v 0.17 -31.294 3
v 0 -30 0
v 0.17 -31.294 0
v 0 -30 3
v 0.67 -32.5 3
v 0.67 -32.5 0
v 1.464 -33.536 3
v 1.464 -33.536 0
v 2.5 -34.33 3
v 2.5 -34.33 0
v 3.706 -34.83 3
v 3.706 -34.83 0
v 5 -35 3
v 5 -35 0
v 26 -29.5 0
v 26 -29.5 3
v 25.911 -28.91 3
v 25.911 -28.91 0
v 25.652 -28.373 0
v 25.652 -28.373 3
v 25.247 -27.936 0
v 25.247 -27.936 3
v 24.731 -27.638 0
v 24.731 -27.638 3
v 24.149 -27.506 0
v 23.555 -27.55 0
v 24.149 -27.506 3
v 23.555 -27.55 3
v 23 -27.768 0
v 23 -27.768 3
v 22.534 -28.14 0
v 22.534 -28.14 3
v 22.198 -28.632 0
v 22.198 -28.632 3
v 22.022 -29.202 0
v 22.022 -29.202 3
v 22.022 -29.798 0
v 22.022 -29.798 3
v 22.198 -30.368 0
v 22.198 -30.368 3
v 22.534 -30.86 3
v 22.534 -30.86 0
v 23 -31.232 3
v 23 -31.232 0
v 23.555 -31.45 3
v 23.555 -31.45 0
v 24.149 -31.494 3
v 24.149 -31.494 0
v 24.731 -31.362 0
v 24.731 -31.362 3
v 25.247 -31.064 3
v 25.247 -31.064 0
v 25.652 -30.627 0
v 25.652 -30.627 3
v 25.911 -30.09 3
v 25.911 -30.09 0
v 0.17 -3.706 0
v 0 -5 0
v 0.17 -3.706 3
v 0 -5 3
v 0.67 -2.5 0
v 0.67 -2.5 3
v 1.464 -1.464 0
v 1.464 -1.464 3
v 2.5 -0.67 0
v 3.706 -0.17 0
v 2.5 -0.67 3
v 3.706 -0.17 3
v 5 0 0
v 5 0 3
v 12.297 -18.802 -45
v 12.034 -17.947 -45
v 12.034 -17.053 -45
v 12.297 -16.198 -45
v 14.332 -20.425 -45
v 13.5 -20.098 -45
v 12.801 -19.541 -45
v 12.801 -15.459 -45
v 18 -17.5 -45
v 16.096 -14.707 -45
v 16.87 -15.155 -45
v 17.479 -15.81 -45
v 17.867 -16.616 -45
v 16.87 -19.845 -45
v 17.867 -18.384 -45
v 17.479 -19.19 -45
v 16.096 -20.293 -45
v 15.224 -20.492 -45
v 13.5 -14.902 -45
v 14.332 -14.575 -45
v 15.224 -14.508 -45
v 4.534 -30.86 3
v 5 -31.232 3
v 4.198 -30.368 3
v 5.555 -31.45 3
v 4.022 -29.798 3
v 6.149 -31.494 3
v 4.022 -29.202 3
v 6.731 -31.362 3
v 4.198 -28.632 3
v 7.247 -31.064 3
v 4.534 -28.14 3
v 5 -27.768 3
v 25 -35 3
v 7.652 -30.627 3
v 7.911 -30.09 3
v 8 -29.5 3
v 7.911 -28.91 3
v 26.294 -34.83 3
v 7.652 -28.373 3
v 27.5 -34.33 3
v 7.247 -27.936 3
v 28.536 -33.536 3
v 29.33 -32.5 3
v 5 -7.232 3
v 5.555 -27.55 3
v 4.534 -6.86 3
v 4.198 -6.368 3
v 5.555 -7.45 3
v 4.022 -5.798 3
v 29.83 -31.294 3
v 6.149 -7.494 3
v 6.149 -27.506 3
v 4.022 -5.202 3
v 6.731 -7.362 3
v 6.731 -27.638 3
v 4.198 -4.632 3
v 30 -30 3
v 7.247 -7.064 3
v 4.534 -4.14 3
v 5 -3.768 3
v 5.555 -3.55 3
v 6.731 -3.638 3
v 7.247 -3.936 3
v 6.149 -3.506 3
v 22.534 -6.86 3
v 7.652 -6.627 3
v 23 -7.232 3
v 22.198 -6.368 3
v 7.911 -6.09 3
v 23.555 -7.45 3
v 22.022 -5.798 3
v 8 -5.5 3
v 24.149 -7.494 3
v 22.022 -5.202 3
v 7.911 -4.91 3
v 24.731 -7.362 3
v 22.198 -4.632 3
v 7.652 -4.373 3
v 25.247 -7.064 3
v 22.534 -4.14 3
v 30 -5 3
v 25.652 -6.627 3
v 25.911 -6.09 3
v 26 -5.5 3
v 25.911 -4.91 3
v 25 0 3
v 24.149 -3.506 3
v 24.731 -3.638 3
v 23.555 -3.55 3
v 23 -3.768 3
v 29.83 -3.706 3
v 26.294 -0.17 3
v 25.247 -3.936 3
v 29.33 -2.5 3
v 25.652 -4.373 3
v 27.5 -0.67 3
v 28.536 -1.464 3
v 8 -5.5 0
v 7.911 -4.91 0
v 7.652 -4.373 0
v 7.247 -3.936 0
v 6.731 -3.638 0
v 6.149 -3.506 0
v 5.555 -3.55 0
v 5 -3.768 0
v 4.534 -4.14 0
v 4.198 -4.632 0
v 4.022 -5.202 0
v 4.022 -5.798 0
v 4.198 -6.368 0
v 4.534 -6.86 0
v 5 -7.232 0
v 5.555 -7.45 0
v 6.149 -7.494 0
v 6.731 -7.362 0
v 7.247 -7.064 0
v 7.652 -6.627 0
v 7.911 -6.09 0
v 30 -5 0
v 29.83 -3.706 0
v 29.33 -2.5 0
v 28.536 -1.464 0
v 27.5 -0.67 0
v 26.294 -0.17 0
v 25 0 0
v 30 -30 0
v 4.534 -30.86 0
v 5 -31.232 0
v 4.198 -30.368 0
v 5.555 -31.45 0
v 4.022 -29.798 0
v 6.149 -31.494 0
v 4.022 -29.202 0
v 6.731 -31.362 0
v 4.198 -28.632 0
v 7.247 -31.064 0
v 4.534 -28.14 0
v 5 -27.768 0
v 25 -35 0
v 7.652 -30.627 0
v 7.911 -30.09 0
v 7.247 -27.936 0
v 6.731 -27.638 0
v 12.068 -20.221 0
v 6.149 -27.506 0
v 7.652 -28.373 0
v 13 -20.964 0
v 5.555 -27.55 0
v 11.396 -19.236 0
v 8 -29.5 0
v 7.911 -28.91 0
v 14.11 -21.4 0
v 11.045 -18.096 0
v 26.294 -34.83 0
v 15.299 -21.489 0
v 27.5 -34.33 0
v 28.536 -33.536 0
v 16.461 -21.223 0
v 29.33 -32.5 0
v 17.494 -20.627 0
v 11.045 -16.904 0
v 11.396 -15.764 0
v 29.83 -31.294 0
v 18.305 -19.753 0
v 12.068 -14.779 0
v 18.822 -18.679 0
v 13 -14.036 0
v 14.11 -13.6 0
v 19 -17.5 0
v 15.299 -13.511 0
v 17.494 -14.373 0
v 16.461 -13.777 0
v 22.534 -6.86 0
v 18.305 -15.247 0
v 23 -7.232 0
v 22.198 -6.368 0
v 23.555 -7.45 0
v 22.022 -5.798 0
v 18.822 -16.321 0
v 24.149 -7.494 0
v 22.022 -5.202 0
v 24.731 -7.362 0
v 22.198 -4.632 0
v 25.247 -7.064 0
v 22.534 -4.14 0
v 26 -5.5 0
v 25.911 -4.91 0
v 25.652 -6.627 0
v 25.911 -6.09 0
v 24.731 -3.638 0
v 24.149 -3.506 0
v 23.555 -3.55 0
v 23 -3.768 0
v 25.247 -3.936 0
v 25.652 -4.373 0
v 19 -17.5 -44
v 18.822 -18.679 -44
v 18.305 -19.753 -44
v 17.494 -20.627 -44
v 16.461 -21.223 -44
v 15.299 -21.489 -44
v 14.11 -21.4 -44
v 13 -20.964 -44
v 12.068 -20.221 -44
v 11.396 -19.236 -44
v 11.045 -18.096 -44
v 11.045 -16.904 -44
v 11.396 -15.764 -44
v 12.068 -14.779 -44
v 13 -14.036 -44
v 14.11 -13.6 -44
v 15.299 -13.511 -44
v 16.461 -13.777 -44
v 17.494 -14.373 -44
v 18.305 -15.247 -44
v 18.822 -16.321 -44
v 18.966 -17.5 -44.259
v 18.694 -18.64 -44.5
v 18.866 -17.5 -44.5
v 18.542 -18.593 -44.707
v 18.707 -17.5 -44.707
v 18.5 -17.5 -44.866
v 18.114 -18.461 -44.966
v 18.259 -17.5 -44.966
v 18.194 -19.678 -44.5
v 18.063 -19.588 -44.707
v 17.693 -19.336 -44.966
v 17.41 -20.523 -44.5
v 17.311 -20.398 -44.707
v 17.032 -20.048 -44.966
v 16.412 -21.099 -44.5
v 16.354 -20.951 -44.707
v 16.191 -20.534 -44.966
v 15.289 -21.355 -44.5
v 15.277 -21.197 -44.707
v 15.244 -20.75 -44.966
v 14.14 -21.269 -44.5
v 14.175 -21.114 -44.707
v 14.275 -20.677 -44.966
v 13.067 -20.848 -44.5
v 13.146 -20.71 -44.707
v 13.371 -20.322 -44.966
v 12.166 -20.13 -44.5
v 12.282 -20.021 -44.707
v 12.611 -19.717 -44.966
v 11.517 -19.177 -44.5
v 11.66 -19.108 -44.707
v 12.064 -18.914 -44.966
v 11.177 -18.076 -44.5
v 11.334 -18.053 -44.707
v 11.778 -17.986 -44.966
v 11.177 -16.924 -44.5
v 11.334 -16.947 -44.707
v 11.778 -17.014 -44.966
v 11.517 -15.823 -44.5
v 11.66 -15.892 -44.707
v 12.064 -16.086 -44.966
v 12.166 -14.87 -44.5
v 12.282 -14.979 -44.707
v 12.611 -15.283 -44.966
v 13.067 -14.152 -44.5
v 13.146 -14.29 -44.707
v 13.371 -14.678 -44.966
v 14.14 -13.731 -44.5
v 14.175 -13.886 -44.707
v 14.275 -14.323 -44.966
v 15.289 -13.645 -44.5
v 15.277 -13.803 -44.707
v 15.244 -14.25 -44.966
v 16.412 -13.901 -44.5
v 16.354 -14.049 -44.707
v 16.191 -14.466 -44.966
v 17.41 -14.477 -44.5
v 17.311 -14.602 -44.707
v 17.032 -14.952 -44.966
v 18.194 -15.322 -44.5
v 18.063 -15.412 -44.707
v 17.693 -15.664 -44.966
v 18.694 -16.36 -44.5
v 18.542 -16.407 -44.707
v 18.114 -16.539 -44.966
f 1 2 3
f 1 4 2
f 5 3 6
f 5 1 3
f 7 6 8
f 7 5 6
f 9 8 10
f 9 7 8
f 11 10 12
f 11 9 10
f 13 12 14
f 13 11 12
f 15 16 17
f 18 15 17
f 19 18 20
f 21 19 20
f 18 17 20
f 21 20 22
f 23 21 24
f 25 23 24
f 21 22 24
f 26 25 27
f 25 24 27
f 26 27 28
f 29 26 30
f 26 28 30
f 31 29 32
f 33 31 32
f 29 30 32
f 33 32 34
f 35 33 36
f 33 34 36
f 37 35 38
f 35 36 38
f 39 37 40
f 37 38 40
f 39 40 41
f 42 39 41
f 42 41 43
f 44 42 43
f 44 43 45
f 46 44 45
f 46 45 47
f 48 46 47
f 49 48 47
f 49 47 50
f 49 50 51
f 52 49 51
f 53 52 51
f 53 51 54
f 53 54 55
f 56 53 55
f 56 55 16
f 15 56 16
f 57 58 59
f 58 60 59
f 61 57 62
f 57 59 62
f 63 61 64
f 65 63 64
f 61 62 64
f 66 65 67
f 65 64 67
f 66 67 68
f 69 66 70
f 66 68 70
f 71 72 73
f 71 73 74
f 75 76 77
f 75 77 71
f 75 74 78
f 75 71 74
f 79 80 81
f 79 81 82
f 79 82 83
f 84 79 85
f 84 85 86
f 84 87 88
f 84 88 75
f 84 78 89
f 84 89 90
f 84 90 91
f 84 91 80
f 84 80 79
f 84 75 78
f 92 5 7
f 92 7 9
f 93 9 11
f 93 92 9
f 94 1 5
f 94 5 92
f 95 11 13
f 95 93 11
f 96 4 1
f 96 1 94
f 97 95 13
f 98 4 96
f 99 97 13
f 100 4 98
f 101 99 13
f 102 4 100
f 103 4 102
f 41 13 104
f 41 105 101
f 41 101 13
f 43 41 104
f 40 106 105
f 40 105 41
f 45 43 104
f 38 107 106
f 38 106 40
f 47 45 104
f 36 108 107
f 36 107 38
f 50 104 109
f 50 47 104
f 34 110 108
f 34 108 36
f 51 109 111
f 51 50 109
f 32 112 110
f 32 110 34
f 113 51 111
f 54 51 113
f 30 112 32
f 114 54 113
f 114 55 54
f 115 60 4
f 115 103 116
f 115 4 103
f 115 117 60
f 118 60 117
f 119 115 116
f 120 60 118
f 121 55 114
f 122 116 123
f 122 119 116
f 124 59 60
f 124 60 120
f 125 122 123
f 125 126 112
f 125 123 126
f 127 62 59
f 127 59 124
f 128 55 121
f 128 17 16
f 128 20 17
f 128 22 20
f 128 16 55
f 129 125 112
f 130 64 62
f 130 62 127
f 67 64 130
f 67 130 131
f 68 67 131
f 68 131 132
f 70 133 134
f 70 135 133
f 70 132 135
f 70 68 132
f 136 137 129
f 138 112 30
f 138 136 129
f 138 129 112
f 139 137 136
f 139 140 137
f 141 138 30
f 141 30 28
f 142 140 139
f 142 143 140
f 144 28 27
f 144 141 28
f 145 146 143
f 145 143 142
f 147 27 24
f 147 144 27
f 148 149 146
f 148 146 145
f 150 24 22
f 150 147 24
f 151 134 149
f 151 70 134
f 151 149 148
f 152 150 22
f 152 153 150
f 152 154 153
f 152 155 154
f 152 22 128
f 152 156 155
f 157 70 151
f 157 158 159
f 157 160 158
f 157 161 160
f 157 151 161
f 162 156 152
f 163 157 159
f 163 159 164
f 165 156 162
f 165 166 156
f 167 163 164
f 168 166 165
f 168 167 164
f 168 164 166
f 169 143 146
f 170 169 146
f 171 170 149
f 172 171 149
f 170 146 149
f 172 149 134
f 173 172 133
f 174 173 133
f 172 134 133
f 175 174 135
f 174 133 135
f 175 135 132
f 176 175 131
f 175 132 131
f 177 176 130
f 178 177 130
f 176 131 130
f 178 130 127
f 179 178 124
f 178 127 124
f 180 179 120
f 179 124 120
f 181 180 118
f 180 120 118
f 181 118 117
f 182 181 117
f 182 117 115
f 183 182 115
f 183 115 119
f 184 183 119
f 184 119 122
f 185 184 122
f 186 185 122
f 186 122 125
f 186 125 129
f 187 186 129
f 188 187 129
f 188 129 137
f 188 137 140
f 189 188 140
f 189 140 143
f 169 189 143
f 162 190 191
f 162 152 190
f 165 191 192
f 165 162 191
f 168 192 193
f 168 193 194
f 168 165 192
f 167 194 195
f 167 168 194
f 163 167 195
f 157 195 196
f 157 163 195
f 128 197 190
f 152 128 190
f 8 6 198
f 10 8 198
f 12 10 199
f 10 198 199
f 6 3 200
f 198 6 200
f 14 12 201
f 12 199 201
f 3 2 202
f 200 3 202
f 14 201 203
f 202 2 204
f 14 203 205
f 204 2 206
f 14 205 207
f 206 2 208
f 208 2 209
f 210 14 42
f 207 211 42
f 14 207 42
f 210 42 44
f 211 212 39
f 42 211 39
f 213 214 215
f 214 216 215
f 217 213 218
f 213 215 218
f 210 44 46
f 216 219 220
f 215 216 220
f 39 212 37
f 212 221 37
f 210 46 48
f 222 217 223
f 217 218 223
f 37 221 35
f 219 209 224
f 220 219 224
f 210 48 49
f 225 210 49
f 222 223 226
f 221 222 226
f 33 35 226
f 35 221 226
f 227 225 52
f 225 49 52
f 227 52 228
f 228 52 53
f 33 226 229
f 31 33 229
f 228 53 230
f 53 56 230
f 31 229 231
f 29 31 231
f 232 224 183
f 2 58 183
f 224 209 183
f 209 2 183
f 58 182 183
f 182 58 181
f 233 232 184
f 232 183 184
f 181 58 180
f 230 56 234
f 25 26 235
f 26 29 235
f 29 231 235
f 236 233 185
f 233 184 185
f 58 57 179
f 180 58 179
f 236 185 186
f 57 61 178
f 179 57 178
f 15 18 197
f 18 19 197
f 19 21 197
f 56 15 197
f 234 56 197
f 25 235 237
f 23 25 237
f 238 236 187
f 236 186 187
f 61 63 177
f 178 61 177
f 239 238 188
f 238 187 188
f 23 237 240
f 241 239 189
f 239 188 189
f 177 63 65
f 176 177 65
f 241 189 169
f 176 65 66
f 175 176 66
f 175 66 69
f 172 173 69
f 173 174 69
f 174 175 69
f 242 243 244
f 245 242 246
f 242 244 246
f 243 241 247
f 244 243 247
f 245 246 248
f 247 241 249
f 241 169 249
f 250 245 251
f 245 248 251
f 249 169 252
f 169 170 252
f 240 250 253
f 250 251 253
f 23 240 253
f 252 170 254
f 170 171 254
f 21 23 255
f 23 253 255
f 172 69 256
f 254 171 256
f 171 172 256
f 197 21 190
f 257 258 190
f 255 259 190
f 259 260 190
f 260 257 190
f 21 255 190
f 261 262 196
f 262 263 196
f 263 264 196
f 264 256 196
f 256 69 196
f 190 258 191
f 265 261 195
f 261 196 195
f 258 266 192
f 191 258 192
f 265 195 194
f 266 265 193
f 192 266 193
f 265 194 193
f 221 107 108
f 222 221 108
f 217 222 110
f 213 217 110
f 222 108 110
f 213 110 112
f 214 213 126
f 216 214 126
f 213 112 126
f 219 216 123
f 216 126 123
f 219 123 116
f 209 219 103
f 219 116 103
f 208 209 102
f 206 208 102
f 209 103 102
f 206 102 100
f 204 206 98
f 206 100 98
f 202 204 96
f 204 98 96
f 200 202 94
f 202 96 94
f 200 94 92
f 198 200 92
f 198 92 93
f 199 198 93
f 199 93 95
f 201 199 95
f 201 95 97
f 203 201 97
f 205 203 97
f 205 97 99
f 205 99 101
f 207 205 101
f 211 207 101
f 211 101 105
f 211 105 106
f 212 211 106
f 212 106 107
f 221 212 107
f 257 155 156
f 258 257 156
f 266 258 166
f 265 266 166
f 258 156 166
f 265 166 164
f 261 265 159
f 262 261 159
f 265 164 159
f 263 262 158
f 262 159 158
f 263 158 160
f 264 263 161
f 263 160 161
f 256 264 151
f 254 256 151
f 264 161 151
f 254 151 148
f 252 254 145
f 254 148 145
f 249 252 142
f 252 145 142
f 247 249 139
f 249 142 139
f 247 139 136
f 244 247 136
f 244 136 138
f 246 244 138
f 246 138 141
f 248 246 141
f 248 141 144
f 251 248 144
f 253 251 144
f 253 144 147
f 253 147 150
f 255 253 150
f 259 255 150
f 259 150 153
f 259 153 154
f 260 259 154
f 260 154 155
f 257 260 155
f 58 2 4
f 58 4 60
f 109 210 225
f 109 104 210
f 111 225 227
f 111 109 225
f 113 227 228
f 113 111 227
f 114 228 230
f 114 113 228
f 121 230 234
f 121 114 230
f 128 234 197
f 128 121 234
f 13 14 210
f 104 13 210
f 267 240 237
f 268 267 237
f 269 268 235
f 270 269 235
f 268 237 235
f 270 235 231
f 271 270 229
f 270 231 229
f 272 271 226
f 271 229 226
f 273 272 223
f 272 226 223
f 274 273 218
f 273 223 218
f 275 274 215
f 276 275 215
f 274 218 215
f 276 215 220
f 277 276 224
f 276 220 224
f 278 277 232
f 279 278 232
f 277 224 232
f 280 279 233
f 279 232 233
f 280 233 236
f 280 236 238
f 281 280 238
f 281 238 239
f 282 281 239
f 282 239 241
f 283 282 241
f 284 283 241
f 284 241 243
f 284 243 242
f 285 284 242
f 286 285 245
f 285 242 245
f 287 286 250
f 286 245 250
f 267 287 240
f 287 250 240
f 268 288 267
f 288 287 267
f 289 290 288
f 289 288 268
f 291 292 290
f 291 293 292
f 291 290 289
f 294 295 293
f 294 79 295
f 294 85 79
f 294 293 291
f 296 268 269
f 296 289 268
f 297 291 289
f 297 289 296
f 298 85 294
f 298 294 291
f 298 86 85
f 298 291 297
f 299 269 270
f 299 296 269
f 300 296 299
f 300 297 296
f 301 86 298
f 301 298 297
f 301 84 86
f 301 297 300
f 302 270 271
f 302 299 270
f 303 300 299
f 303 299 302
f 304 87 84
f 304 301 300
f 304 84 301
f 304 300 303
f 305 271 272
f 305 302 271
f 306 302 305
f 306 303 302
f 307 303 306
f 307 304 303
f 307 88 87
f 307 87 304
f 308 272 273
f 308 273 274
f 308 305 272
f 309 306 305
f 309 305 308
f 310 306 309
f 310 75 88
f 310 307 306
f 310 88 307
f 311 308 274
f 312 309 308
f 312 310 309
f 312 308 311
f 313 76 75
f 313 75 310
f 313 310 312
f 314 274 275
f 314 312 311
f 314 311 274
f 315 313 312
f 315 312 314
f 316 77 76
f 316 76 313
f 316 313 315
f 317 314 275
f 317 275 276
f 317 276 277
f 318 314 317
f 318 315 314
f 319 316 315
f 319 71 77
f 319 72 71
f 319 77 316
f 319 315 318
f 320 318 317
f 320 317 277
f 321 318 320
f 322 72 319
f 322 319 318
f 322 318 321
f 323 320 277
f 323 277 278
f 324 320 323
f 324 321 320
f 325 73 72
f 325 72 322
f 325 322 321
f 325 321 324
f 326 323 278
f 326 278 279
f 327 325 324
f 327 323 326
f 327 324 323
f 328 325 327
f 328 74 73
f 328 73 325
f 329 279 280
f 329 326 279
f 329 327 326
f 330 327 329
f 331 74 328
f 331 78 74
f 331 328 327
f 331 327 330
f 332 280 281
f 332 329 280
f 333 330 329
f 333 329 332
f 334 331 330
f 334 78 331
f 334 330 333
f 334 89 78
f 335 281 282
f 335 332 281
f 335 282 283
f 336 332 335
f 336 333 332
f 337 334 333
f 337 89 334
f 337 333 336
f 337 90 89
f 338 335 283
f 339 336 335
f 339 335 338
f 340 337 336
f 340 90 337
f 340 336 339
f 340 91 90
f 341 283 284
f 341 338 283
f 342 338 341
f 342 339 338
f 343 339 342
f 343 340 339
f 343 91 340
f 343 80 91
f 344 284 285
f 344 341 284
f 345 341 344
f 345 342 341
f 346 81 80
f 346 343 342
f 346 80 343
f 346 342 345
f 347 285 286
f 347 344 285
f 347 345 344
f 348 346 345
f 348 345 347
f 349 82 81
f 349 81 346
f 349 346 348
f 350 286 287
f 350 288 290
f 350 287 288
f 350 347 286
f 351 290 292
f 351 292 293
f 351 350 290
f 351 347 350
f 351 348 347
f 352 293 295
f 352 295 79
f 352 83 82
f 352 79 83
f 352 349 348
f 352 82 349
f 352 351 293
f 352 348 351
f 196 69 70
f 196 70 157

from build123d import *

# Parameters (mm, degrees)
SKETCH2_W           = 30
SKETCH2_H           = 35
BOSS_EXTRUDE1_DEPTH = 3
FILLET1_R           = 5
SKETCH3_R           = 2
CUT_EXTRUDE1_DEPTH  = 10
SKETCH6_R           = 4
BOSS_EXTRUDE2_DEPTH = 45
FILLET2_R           = 1


with BuildPart() as part:
    # Sketch2 → Boss-Extrude1 (new body)
    with BuildSketch(Plane.XY):
        with Locations((15, -17.5)):
            Rectangle(SKETCH2_W, SKETCH2_H)
    extrude(amount=BOSS_EXTRUDE1_DEPTH)

    # Fillet1
    fillet1_edges = [part.edges().sort_by_distance(p)[0] for p in [
        (0, 0, 1.5),
        (30, 0, 1.5),
        (30, -35, 1.5),
        (0, -35, 1.5),
    ]]
    fillet(fillet1_edges, radius=FILLET1_R)

    # Sketch3 → Cut-Extrude1 (cut)
    with BuildSketch(Plane.XY.offset(3)):
        with Locations((6, -5.5)):
            Circle(SKETCH3_R)
        with Locations((24, -5.5)):
            Circle(SKETCH3_R)
        with Locations((6, -29.5)):
            Circle(SKETCH3_R)
        with Locations((24, -29.5)):
            Circle(SKETCH3_R)
    extrude(amount=-CUT_EXTRUDE1_DEPTH, mode=Mode.SUBTRACT)

    # Sketch6 → Boss-Extrude2 (add)
    with BuildSketch(Plane(origin=(0, 0, 0), x_dir=(-1, 0, 0), z_dir=(0, 0, -1))):
        with Locations(Location((-15, -17.5, 0), (0, 0, 180))):
            Circle(SKETCH6_R)
    extrude(amount=BOSS_EXTRUDE2_DEPTH)

    # Fillet2
    fillet2_edges = [part.edges().sort_by_distance(p)[0] for p in [
        (11, -17.5, -45),
    ]]
    fillet(fillet2_edges, radius=FILLET2_R)


solid = part.part
